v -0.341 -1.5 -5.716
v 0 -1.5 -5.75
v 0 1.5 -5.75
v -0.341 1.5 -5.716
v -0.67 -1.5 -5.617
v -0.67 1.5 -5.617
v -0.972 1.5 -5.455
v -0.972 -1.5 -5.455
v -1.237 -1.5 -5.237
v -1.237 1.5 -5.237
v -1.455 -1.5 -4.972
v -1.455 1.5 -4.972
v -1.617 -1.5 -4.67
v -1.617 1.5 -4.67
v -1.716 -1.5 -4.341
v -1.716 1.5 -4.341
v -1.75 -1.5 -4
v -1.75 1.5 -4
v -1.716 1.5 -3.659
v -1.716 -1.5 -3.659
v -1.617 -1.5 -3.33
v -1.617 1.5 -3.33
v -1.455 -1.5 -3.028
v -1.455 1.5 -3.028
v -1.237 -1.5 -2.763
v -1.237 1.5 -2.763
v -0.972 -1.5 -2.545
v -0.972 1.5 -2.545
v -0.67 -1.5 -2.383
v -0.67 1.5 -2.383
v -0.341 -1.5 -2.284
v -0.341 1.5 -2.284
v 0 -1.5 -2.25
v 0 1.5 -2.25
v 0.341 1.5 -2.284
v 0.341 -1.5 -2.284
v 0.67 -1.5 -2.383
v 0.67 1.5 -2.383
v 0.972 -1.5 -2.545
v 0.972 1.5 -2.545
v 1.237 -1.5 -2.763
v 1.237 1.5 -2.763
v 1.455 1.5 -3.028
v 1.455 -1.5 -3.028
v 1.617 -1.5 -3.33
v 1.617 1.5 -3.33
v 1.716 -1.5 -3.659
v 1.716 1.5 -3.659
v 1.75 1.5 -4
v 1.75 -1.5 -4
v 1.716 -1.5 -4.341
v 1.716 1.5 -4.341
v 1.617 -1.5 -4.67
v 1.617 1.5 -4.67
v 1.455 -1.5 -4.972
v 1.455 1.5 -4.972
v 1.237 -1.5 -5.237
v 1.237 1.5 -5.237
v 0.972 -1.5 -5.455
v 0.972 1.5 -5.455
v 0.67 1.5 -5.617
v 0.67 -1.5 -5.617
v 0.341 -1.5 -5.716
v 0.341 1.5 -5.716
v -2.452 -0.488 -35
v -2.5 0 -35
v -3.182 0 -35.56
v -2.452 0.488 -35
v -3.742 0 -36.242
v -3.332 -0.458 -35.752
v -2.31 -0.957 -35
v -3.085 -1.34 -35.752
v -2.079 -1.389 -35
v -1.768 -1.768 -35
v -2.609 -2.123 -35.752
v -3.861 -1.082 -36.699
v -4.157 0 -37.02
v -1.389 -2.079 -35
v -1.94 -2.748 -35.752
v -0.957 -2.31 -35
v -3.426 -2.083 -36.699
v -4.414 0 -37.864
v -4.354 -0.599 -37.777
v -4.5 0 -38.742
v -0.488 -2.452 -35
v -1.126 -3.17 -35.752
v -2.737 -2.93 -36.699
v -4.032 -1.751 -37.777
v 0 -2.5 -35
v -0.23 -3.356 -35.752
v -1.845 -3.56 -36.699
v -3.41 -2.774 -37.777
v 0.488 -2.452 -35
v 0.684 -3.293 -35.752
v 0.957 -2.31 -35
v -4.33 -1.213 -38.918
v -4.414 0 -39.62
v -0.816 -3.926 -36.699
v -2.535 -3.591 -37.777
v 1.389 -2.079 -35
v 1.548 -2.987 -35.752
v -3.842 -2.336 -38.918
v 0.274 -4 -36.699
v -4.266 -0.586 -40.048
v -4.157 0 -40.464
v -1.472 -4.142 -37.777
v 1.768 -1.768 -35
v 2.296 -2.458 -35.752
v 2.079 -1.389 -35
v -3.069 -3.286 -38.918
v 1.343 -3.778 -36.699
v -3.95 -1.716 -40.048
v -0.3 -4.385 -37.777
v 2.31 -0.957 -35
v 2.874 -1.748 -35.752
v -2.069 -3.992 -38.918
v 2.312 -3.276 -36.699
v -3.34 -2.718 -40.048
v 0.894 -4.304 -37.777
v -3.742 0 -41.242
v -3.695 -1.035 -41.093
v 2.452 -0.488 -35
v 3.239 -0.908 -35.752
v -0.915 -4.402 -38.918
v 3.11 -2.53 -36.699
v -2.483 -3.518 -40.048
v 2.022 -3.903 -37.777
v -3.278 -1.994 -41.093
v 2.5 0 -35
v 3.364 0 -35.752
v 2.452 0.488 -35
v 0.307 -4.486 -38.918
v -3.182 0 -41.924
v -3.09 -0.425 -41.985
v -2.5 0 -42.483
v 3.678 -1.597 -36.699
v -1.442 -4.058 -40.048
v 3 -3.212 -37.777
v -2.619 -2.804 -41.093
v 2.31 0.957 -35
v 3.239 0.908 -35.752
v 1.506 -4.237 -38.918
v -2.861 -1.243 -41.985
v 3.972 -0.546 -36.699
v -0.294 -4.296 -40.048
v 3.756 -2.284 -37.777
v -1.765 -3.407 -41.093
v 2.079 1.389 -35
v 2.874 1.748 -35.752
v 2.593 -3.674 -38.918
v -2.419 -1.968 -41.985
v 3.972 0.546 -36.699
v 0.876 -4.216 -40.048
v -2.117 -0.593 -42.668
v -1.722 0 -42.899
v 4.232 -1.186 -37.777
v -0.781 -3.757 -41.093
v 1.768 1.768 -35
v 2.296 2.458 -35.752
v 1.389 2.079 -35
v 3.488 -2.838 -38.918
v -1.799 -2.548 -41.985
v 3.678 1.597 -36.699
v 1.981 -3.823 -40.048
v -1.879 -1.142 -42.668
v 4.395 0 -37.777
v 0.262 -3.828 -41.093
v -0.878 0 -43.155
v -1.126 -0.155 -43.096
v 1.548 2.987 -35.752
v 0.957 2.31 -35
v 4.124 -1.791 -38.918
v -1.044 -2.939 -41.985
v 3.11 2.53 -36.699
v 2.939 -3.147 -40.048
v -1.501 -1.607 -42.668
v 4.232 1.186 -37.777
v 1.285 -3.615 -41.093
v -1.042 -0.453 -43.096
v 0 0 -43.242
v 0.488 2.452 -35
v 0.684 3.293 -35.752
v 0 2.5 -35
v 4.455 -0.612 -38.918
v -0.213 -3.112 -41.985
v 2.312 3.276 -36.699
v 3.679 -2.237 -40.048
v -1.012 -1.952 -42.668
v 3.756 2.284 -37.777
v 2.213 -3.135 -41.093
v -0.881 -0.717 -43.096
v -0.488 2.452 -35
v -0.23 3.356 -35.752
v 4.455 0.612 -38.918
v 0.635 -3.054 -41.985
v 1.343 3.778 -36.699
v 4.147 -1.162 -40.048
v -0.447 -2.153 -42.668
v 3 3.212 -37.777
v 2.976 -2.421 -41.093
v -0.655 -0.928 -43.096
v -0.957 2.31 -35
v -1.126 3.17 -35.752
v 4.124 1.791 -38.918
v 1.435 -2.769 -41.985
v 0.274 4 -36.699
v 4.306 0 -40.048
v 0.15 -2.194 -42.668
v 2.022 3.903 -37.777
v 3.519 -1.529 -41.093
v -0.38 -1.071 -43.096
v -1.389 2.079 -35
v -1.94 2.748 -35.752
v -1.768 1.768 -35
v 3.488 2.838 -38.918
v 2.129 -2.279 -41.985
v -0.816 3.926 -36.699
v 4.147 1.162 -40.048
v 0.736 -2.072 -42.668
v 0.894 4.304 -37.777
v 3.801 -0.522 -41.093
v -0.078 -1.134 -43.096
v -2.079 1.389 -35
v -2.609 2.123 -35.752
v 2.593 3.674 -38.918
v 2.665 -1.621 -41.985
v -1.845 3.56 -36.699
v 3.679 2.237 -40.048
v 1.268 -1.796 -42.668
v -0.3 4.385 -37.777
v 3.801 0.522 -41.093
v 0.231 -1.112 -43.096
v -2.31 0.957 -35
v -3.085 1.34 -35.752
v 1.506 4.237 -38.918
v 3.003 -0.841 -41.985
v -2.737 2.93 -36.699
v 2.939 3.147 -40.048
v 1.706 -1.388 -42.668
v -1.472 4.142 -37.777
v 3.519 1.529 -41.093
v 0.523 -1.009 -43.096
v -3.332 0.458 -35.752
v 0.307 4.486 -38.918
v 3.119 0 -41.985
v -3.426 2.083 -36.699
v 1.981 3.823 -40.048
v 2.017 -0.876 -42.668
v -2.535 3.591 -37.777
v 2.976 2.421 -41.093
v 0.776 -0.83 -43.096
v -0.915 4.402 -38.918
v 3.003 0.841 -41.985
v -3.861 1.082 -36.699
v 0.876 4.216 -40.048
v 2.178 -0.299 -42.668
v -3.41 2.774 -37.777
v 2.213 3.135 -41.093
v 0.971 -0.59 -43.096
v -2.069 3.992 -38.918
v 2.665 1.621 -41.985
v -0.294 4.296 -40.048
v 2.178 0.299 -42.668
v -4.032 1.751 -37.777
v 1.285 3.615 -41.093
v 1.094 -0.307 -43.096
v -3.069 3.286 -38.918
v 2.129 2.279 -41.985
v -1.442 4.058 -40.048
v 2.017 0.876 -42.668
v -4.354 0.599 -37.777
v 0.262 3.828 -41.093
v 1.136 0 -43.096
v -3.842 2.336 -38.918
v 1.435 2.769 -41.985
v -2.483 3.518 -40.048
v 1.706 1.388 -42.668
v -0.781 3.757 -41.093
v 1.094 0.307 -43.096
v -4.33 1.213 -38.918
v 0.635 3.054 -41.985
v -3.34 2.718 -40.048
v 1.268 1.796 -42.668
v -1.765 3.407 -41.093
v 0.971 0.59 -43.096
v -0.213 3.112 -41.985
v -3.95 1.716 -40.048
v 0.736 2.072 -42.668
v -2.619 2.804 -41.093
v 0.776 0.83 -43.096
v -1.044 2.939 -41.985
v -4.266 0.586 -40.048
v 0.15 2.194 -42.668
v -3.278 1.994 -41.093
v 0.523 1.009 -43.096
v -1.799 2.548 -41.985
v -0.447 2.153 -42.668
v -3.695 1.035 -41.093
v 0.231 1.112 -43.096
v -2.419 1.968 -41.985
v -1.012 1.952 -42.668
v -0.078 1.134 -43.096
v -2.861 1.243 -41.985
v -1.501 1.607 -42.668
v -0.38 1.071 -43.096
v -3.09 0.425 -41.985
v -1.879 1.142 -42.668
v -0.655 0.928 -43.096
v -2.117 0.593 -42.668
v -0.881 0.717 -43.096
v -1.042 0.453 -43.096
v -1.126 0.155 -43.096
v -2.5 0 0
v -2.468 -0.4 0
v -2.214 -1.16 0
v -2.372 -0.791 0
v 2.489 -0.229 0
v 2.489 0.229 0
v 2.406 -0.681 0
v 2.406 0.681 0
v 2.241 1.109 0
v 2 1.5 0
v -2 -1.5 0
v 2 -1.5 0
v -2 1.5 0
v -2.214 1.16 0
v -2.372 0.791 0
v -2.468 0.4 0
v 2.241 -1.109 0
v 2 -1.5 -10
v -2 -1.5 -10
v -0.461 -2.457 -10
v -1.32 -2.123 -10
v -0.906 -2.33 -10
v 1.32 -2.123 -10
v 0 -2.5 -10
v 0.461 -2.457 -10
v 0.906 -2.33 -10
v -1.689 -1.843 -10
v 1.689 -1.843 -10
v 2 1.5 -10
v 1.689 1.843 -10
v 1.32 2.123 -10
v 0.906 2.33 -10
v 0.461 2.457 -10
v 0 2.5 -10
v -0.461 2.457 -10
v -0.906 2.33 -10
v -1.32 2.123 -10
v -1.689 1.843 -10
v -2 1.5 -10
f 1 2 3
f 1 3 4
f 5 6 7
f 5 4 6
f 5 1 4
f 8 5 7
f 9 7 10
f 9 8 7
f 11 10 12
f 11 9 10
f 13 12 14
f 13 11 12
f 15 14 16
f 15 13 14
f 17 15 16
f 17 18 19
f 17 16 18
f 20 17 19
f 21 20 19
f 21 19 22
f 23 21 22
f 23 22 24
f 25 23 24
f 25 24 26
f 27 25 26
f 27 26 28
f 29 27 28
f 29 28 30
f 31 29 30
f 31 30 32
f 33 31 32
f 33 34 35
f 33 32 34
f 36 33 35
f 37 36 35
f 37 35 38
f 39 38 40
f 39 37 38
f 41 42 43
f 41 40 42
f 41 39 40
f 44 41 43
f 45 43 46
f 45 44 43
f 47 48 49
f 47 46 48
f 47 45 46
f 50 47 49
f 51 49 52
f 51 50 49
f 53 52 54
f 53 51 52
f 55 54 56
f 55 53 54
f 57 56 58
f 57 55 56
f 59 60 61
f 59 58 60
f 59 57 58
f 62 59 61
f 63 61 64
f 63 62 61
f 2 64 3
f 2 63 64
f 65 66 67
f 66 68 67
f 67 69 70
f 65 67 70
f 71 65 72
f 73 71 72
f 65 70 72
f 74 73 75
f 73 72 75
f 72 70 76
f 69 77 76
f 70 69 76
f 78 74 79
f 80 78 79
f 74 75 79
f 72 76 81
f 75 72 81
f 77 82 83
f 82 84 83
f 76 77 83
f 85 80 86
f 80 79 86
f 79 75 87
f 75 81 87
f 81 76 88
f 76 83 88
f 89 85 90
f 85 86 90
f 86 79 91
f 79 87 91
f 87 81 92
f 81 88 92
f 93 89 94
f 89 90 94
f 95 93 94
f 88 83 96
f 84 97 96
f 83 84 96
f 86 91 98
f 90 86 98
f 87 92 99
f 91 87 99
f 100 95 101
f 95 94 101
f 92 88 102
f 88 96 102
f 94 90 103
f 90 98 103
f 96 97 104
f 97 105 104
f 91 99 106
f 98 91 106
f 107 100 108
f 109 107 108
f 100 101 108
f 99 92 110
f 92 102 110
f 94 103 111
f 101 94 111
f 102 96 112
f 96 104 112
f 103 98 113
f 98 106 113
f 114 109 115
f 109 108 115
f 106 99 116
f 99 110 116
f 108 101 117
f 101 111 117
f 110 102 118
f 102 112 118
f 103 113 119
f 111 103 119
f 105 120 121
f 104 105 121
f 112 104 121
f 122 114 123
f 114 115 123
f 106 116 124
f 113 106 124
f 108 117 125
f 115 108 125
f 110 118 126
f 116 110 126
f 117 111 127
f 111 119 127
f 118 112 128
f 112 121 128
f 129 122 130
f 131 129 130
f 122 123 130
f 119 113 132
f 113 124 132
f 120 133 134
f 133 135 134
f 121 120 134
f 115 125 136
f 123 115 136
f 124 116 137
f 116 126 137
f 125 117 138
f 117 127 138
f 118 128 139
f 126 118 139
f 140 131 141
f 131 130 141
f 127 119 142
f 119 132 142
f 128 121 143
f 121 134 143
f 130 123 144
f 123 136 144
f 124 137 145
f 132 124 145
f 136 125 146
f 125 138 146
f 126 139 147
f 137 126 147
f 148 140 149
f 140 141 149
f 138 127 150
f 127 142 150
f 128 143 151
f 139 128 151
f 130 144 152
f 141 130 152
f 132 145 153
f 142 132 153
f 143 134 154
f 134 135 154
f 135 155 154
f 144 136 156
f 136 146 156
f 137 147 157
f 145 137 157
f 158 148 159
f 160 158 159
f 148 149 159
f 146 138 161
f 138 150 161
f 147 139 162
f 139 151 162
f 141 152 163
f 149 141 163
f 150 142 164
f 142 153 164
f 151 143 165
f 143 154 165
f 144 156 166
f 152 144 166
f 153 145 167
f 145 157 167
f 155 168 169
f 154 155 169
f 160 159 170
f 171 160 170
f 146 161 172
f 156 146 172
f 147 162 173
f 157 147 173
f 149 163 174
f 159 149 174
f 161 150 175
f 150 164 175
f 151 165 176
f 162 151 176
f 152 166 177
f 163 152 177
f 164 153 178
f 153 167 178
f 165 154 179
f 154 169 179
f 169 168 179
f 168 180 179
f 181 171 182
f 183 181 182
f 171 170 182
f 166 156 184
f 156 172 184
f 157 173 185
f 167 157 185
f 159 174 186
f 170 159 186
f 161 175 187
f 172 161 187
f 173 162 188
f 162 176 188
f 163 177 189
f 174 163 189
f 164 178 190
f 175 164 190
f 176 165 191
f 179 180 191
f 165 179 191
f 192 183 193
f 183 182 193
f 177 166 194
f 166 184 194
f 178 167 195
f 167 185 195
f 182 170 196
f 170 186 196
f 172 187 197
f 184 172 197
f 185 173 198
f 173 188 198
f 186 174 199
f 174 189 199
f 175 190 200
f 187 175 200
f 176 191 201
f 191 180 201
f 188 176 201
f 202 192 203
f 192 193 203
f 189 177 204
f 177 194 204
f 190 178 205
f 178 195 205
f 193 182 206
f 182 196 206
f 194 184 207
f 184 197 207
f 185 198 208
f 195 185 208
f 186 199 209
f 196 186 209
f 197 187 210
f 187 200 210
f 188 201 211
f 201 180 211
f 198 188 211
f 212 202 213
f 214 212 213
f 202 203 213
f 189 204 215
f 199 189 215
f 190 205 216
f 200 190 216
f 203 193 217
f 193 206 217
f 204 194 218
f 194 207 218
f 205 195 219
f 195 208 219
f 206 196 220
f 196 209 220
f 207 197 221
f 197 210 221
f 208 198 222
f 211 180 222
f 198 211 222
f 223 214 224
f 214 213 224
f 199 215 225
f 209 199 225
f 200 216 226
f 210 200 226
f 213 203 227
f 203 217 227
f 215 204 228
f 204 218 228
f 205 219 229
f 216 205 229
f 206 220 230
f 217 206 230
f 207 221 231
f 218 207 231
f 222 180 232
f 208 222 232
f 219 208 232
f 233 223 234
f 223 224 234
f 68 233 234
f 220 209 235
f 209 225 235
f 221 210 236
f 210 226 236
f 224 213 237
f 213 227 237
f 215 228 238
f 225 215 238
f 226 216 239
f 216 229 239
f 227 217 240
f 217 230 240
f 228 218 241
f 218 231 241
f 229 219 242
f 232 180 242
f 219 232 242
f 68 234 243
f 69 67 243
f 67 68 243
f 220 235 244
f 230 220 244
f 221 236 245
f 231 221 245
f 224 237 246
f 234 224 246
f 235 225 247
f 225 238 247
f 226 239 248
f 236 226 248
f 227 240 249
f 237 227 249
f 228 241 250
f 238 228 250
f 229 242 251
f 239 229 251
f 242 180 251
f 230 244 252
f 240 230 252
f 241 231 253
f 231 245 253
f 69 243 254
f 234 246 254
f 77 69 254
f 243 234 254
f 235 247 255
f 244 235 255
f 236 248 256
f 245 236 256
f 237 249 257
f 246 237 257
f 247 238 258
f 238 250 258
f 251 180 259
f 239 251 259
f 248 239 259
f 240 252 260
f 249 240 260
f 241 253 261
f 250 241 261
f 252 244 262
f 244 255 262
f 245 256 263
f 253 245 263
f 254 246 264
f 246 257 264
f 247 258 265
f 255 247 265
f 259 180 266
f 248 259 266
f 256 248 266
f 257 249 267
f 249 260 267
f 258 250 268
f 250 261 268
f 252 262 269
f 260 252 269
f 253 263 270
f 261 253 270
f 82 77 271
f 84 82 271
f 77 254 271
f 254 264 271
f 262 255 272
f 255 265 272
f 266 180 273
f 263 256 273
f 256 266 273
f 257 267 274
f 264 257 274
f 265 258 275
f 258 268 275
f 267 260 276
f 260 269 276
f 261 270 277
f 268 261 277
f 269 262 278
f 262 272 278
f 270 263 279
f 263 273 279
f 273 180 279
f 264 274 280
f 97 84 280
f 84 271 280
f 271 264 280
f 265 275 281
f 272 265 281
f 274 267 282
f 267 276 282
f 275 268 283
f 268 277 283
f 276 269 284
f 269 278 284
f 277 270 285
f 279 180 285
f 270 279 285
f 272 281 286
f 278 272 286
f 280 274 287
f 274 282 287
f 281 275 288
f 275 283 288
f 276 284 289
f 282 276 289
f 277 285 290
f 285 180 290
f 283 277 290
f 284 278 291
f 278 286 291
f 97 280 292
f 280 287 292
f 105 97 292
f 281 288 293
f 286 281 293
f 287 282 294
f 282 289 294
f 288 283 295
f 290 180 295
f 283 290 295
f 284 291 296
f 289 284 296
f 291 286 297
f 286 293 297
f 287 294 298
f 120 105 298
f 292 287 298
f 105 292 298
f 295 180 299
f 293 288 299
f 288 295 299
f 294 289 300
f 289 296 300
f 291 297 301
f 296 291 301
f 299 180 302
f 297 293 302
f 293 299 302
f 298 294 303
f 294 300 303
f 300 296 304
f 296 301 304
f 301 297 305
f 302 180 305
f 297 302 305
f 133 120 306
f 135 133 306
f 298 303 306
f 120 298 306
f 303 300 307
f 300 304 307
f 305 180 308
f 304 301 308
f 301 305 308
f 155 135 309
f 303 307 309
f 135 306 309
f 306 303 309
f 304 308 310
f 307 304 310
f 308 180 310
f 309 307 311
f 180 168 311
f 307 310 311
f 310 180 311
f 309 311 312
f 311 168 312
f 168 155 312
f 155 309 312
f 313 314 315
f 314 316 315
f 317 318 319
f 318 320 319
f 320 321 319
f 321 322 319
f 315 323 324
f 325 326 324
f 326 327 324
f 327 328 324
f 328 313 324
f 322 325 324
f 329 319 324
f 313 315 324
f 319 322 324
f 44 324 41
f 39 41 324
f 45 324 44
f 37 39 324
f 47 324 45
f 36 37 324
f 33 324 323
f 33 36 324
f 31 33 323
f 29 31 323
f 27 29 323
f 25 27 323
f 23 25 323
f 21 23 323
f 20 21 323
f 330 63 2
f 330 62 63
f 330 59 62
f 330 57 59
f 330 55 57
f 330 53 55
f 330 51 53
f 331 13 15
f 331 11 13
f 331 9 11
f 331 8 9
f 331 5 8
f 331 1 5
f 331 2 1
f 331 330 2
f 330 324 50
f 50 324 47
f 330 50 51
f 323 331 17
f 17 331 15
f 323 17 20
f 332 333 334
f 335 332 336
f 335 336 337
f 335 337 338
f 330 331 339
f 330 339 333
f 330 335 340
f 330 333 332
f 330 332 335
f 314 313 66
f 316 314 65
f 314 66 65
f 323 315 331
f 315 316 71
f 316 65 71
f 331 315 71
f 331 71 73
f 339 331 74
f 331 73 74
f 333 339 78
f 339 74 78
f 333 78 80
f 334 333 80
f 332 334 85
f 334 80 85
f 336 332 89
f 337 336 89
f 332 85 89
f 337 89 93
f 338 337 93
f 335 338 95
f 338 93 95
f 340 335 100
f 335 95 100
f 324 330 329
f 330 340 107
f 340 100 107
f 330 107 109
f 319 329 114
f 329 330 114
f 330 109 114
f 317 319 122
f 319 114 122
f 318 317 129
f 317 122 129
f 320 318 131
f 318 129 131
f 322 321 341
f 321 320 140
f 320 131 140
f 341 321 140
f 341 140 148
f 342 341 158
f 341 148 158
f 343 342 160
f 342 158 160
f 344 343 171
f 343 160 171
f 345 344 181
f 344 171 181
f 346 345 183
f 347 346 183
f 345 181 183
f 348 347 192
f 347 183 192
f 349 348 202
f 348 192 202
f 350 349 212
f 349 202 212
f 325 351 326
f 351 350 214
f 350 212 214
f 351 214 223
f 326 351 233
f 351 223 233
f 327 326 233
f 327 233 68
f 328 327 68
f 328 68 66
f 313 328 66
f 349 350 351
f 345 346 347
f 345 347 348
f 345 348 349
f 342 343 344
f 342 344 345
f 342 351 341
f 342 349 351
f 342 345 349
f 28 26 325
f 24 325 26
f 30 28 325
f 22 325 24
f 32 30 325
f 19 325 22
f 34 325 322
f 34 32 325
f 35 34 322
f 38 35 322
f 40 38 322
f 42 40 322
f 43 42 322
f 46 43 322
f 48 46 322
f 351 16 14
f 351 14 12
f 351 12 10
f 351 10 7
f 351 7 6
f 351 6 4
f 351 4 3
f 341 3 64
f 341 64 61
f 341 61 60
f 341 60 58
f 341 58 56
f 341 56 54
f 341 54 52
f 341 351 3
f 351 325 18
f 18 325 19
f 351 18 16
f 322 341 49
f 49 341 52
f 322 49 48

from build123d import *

# Parameters (mm, degrees)
CUT_EXTRUDE3_START      = -10
CUT_EXTRUDE3_DEPTH      = 10
CUT_EXTRUDE4_DEPTH      = 44.707447118
CUT_EXTRUDE4_DEPTH_BACK = 44.707447118
SKETCH4_R               = 1.75


with BuildPart() as part:
    # Sketch1 → Revolve1 (revolve)
    with BuildSketch(Plane(origin=(0, 0, 0), x_dir=(1, 0, 0), z_dir=(0, 1, 0)), mode=Mode.PRIVATE) as revolve1_sk:
        with BuildLine():
            Line((0, 43.241657387), (0, 0))
            Line((0, 0), (2.5, 0))
            Line((2.5, 0), (2.5, 35))
            ThreePointArc((2.5, 35), (4.30624304, 40.047900427), (0, 43.241657387))
        make_face()
    revolve(revolve1_sk.sketch.rotate(Axis((0, 0, -43.241657387), (0, 0, 1)), 180), axis=Axis((0, 0, -43.241657387), (0, 0, 1)))

    # Sketch2 → Cut-Extrude3 (cut)
    with BuildSketch(Plane.XY.offset(CUT_EXTRUDE3_START)):
        with BuildLine():
            ThreePointArc((2, 1.5), (0, 2.5), (-2, 1.5))
            Line((-2, 1.5), (2, 1.5))
        make_face()
        with BuildLine():
            Line((2, -1.5), (-2, -1.5))
            ThreePointArc((-2, -1.5), (0, -2.5), (2, -1.5))
        make_face()
    extrude(amount=CUT_EXTRUDE3_DEPTH, mode=Mode.SUBTRACT)

    # Sketch4 → Cut-Extrude4 (cut, two sides: drawn at the far end of the back side and taken through both)
    with BuildSketch(Plane(origin=(0, 0, 0), x_dir=(1, 0, 0), z_dir=(0, 1, 0)).offset(-CUT_EXTRUDE4_DEPTH_BACK)):
        with Locations(Location((0, 4, 0), (0, 0, 90))):
            Circle(SKETCH4_R)
    extrude(amount=CUT_EXTRUDE4_DEPTH + CUT_EXTRUDE4_DEPTH_BACK, mode=Mode.SUBTRACT)


solid = part.part
